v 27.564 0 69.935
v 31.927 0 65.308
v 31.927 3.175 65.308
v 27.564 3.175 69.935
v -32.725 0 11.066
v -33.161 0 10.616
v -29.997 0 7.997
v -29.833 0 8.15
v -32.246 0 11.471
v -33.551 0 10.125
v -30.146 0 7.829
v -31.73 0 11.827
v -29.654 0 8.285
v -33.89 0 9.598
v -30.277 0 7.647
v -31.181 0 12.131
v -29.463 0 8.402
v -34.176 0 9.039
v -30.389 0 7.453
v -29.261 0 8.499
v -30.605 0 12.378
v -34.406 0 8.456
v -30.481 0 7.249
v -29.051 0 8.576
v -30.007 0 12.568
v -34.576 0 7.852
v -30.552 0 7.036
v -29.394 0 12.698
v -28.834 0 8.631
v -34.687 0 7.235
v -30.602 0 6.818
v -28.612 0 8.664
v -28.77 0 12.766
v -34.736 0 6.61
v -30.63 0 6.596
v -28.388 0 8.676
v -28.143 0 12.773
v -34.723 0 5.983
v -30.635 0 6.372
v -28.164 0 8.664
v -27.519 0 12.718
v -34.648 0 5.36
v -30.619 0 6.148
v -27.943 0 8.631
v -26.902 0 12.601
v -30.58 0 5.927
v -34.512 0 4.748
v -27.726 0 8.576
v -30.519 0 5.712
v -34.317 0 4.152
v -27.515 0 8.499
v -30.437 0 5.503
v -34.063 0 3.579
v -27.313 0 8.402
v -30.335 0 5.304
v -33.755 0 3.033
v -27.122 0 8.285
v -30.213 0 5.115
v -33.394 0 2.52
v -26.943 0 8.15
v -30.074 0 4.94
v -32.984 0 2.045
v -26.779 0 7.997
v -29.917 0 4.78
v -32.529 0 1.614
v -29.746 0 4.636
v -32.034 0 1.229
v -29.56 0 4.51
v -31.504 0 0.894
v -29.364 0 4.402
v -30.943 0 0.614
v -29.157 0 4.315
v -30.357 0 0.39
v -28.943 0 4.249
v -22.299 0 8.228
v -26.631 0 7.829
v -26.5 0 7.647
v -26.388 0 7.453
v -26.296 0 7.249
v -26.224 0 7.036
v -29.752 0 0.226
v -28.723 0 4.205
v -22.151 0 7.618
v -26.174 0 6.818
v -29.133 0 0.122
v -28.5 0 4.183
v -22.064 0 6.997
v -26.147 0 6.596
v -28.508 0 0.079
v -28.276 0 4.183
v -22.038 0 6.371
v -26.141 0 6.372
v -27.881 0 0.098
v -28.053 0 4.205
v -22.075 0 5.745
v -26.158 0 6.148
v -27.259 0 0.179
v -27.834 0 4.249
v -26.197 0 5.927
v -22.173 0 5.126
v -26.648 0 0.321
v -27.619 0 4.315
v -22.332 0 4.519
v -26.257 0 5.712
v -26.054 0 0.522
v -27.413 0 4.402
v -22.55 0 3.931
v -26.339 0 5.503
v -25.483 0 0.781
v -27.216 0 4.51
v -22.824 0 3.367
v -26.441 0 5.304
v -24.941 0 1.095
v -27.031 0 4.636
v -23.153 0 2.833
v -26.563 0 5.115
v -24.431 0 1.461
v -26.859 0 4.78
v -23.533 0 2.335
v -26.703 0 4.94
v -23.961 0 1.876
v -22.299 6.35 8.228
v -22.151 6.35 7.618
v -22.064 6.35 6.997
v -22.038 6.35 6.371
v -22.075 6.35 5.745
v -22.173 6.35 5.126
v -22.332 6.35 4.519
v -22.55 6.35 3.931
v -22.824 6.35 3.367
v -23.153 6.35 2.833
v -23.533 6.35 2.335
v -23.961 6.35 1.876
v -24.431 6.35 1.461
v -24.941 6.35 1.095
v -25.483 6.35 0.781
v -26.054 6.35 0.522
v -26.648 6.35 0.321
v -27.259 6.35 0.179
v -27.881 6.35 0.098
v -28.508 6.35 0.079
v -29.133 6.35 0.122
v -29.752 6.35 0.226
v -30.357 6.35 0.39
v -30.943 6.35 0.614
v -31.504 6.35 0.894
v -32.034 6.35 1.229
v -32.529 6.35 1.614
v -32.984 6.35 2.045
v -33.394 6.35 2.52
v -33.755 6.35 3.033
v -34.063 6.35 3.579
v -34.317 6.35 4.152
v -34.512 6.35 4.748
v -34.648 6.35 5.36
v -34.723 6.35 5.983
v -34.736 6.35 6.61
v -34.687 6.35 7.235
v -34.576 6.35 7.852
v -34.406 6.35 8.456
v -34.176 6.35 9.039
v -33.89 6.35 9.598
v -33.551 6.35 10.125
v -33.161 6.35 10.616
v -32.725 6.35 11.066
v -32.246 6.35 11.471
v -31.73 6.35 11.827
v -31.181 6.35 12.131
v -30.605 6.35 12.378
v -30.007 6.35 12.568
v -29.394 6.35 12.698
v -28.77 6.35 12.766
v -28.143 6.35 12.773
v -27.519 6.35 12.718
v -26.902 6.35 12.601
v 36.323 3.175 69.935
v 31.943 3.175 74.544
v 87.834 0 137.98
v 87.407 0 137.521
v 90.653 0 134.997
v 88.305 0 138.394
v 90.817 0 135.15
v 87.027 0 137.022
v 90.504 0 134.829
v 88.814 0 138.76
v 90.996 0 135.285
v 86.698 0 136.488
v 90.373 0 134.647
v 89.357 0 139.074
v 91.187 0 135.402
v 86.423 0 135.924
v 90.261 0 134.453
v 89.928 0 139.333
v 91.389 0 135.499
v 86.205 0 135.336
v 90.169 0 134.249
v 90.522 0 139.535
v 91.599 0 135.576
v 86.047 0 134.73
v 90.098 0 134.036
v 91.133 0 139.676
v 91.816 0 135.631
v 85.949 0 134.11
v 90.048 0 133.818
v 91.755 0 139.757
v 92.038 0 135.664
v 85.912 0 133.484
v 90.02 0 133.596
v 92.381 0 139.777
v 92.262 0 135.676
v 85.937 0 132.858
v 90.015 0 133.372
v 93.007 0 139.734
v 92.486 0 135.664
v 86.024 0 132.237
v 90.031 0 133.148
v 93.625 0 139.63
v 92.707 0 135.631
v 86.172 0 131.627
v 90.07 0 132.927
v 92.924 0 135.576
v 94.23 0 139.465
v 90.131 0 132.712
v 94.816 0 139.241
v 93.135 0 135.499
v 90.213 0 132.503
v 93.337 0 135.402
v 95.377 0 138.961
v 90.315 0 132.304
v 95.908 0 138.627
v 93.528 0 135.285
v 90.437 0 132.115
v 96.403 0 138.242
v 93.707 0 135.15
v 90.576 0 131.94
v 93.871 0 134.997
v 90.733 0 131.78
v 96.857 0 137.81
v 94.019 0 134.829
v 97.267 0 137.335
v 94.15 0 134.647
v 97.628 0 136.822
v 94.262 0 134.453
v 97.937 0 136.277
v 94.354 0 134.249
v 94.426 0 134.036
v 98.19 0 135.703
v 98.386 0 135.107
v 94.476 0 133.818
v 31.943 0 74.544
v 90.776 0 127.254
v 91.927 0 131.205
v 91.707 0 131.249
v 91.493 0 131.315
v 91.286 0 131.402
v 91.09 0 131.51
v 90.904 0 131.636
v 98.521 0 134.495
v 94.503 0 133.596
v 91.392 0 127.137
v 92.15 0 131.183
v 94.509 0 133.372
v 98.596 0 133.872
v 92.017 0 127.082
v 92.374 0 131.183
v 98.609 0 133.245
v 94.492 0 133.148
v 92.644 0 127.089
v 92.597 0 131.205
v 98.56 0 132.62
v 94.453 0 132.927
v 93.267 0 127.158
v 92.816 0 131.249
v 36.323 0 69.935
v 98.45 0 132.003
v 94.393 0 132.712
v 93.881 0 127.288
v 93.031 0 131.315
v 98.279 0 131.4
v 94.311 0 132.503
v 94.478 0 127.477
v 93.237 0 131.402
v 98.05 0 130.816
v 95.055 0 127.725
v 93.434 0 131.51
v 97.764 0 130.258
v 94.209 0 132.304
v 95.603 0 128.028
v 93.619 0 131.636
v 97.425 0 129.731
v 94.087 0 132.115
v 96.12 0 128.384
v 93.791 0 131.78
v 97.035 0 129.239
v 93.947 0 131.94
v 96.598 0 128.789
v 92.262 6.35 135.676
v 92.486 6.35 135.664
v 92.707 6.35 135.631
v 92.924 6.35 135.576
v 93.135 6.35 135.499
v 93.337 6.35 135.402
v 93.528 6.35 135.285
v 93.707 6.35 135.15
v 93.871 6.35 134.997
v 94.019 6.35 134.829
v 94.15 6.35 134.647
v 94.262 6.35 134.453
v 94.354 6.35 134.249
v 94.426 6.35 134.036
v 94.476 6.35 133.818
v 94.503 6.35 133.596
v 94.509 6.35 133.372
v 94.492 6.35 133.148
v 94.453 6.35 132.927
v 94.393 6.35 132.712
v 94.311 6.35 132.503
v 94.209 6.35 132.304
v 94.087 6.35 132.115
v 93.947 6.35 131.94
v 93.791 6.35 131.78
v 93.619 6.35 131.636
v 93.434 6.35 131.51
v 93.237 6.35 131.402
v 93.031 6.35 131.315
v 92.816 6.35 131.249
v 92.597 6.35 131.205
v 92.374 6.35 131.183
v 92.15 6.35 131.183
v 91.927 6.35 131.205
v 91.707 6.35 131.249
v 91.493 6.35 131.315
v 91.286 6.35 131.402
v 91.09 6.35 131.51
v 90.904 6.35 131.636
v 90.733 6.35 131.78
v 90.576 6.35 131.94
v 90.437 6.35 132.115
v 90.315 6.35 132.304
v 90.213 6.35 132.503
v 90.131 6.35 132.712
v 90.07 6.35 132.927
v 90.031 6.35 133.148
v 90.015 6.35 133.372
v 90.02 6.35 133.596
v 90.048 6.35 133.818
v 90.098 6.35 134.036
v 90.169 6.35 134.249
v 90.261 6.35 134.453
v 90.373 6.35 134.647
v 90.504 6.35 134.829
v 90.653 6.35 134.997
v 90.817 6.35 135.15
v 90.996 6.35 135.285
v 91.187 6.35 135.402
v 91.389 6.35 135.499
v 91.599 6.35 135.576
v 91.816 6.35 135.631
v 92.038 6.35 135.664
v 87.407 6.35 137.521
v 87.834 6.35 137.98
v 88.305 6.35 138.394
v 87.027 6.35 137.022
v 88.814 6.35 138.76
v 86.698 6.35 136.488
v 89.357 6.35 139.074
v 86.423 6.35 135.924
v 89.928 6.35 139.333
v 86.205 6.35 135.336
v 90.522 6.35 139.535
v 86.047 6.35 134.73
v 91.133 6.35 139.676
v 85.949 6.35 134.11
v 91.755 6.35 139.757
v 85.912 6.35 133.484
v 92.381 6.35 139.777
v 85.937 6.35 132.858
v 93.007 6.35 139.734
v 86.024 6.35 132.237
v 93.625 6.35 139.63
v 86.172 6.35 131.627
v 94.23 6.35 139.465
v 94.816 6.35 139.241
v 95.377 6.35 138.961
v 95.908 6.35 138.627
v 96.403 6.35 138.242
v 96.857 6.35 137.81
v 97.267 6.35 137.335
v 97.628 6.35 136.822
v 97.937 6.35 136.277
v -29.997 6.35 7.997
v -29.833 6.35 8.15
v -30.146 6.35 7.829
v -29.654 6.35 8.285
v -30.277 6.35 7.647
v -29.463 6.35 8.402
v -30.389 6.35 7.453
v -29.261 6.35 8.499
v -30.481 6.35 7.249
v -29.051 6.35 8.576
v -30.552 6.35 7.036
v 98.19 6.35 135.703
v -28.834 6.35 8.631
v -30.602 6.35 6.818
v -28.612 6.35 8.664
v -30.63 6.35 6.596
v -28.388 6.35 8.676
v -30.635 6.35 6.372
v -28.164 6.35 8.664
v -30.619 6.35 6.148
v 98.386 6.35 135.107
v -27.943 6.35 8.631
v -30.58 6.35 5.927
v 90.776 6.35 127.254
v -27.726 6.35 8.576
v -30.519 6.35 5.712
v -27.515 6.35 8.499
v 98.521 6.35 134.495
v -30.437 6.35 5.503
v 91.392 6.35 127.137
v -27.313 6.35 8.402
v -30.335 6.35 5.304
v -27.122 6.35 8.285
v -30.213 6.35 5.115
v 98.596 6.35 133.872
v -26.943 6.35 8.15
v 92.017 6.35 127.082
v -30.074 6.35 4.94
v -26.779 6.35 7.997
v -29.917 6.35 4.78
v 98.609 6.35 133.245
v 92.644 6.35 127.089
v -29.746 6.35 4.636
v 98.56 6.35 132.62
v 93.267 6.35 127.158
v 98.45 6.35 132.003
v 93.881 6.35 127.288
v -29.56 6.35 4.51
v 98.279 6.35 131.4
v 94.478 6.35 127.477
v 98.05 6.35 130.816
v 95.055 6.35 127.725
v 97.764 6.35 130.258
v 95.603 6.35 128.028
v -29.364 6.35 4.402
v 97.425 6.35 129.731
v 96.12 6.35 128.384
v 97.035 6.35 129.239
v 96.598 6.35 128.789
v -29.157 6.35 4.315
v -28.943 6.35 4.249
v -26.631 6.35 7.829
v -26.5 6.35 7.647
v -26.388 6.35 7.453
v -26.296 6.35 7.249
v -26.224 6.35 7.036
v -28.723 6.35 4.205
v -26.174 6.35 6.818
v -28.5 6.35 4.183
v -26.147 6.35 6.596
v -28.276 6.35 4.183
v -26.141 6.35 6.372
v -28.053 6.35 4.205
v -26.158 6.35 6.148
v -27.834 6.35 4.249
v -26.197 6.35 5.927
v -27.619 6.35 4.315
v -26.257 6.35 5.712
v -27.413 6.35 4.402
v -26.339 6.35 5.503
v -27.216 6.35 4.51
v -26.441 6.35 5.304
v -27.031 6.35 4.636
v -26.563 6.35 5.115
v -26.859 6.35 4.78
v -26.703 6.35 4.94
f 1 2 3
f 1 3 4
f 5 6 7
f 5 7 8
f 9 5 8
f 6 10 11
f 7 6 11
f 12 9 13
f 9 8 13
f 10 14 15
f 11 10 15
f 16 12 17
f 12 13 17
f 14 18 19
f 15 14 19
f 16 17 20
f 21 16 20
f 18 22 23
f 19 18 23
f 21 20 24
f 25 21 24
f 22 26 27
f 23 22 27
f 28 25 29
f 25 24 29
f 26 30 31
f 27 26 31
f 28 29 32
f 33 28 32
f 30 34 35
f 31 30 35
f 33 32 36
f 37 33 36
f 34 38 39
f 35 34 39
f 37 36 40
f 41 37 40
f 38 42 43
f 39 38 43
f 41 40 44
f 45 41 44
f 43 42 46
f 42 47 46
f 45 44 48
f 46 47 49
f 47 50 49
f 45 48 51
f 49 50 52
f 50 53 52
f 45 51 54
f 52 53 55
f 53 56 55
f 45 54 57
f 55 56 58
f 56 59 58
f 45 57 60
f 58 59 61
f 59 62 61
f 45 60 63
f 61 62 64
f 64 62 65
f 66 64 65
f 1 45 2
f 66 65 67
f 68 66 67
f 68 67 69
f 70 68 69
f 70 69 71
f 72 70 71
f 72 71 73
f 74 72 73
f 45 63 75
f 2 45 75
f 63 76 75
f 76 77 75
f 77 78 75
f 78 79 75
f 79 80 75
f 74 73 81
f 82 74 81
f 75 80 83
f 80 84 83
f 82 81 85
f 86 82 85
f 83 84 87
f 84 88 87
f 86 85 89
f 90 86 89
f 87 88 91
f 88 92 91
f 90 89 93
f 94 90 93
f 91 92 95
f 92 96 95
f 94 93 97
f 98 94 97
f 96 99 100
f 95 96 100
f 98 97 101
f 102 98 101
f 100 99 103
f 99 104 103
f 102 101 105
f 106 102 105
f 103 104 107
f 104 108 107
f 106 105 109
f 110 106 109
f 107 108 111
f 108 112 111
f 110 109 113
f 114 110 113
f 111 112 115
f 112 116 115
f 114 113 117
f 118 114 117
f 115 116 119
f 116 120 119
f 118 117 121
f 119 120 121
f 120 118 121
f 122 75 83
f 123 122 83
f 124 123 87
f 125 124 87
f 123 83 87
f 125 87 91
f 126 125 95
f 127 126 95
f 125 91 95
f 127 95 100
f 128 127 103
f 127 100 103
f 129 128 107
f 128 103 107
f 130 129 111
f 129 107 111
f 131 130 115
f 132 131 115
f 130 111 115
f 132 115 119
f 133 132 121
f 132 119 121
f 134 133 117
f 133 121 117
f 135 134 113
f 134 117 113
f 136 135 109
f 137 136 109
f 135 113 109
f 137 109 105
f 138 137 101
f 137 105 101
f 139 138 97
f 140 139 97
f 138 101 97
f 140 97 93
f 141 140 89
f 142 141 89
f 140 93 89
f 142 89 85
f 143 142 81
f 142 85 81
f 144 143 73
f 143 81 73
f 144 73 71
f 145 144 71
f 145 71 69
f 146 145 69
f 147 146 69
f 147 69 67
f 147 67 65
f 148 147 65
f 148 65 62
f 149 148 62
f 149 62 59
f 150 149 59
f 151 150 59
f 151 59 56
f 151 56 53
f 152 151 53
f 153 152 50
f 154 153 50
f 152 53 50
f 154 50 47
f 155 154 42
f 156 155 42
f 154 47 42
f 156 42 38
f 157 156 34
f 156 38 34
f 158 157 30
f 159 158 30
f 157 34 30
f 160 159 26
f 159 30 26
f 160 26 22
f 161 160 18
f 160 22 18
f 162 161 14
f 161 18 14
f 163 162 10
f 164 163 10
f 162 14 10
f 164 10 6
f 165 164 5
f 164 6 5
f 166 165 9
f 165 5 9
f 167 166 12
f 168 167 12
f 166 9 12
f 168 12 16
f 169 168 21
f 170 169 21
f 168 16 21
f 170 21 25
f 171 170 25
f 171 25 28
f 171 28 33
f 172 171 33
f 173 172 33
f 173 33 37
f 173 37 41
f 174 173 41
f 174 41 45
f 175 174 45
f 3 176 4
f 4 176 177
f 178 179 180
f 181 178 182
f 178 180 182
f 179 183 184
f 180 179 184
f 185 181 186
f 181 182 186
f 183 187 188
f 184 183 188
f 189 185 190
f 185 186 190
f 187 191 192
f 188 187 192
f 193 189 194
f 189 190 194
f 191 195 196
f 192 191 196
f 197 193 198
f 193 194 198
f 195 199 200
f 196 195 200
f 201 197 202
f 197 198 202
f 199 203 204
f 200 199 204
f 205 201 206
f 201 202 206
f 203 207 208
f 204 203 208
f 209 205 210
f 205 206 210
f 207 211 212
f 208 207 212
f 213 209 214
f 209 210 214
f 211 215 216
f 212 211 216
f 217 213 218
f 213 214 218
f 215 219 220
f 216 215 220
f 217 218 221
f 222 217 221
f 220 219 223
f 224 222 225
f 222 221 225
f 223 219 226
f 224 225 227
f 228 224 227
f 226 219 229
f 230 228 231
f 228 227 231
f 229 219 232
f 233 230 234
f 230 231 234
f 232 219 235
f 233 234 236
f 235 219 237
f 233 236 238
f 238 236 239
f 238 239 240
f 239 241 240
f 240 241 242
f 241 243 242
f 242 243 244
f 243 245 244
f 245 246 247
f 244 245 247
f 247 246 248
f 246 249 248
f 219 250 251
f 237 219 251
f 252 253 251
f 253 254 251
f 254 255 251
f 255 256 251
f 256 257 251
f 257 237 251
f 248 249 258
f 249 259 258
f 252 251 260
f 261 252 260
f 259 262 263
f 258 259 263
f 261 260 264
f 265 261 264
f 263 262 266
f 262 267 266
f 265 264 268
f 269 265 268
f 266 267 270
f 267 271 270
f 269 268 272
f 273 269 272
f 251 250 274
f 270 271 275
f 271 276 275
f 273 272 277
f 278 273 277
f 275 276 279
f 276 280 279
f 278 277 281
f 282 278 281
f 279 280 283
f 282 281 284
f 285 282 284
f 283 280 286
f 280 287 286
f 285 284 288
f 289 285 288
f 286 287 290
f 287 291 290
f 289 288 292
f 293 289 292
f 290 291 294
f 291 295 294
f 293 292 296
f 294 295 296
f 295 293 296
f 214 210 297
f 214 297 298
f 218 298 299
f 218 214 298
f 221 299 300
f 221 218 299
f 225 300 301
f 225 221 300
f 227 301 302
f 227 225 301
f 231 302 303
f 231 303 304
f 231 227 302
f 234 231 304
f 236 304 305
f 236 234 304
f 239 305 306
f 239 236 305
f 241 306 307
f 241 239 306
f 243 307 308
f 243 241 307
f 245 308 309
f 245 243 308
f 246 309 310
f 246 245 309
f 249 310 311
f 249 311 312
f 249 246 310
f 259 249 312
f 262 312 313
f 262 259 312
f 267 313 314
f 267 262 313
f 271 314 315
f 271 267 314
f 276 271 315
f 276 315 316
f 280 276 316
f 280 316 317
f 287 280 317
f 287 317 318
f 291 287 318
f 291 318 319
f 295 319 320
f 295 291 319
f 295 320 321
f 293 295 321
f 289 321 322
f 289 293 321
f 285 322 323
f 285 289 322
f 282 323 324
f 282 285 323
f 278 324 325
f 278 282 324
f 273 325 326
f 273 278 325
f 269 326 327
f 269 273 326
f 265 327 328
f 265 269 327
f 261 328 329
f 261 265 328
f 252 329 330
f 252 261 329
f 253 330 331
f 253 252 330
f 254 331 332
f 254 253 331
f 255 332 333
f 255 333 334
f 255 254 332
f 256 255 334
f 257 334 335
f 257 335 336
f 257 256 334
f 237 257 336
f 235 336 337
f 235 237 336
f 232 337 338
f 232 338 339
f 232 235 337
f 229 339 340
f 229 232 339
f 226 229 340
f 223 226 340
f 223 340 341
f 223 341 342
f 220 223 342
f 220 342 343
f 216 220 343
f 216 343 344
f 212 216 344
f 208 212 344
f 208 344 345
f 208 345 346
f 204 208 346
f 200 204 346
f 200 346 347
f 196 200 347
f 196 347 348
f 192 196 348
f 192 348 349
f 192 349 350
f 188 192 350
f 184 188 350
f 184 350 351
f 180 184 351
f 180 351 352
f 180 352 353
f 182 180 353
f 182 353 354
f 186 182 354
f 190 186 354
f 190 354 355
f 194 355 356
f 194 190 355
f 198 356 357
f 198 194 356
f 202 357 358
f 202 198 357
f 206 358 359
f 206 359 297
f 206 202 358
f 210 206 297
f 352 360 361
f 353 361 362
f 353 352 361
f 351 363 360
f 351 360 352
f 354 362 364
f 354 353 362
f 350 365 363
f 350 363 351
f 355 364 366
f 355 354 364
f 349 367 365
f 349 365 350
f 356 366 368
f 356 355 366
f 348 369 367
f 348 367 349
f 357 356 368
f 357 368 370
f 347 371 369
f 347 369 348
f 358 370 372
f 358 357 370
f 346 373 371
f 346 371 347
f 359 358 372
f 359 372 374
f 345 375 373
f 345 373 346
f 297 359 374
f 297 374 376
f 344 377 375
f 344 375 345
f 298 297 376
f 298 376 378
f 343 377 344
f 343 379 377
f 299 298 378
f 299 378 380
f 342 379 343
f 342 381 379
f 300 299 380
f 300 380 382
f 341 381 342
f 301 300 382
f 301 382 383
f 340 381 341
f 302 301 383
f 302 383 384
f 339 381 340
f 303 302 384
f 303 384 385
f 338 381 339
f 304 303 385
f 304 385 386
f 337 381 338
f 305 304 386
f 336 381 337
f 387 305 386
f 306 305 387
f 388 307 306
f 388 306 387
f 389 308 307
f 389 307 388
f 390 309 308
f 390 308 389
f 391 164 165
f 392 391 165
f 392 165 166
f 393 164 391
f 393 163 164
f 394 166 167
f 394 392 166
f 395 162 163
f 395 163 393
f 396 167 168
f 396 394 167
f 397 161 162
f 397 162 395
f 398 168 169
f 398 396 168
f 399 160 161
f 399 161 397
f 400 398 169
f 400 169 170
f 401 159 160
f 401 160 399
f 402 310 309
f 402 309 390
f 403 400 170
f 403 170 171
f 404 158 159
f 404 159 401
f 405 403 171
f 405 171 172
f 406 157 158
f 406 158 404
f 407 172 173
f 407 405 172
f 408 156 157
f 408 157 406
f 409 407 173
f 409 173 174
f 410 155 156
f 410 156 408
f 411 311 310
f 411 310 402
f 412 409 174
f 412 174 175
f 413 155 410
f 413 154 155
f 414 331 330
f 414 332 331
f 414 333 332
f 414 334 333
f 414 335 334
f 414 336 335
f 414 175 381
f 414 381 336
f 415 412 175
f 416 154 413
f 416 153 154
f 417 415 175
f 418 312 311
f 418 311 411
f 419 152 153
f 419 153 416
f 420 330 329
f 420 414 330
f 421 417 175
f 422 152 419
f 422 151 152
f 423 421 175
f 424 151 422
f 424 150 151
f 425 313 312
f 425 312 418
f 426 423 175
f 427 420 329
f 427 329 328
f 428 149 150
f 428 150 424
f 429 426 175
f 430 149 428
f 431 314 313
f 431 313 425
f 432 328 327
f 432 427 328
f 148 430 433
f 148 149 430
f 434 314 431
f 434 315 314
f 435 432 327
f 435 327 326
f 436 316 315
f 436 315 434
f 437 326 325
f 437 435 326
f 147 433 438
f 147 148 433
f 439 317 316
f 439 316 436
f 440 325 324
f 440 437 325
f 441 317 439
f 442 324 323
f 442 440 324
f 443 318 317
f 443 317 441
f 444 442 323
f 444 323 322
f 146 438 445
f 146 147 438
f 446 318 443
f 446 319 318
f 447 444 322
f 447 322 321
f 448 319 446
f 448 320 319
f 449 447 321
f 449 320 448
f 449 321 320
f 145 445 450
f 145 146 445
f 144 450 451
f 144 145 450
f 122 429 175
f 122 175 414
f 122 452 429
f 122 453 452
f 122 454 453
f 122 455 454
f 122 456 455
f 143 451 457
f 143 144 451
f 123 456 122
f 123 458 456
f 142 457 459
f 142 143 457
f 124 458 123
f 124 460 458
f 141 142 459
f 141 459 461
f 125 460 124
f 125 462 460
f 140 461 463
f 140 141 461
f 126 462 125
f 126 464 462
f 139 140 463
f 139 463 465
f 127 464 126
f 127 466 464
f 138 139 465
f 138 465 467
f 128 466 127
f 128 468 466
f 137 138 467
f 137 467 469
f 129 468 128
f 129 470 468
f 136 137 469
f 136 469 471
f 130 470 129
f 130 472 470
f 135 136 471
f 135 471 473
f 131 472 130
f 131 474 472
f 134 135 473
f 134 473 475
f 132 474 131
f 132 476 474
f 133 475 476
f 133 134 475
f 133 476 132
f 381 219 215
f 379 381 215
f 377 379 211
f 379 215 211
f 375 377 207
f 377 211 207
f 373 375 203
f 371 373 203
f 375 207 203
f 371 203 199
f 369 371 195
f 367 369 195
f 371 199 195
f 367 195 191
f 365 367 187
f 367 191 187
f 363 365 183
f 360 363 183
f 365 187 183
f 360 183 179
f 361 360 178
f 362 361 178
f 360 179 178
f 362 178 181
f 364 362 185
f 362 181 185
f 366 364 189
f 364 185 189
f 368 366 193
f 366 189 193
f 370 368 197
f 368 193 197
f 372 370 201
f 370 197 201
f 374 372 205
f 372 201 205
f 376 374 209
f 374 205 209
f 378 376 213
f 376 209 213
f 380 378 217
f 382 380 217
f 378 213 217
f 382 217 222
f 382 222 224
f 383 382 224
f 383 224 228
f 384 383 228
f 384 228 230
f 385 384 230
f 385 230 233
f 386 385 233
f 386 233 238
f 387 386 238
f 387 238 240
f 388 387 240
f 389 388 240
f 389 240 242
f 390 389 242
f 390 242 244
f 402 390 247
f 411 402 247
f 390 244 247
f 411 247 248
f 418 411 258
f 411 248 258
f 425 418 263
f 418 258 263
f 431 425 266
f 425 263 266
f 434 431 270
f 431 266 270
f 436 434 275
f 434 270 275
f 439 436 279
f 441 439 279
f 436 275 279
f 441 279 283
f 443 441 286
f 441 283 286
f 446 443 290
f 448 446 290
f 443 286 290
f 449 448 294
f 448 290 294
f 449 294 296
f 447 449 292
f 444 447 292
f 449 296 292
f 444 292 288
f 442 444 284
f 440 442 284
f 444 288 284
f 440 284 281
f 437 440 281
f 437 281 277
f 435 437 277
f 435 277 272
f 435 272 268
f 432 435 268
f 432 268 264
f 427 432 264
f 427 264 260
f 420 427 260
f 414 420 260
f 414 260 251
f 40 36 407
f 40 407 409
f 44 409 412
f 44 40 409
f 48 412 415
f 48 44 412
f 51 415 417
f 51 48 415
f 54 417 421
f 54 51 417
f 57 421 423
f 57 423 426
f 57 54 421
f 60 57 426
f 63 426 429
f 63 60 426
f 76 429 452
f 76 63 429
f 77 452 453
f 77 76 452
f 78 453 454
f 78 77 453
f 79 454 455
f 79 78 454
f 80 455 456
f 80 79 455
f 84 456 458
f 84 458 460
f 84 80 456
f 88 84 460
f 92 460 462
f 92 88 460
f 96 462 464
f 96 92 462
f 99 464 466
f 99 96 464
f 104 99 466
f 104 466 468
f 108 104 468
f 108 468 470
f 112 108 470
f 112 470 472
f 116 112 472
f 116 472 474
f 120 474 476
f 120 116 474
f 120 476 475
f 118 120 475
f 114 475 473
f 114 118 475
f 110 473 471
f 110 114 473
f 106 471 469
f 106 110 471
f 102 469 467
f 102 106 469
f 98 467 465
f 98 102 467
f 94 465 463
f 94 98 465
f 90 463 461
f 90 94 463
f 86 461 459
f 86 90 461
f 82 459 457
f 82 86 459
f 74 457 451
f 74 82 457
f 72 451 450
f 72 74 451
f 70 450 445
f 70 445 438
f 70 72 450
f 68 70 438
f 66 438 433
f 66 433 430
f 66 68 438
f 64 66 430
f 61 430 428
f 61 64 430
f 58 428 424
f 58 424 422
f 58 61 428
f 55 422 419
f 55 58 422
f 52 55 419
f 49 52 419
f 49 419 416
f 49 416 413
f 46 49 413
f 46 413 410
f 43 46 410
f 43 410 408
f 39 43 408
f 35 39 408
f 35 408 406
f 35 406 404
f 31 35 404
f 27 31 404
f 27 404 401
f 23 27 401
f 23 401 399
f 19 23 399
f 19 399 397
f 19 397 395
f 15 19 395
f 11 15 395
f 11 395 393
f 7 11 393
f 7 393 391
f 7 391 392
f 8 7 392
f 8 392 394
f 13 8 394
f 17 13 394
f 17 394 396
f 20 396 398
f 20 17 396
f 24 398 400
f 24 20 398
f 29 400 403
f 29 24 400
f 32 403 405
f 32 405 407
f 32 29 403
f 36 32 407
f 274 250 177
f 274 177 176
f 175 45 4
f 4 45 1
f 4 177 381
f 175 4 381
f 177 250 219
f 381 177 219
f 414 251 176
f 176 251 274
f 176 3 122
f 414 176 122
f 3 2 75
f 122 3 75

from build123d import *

# Parameters (mm, degrees)
SKETCH1_R           = 2.2479
BOSS_EXTRUDE1_DEPTH = 6.35
CUT_EXTRUDE1_DEPTH  = 3.175


with BuildPart() as part:
    # Sketch1 → Boss-Extrude1 (new body)
    with BuildSketch(Plane(origin=(0, 0, 0), x_dir=(1, 0, 0), z_dir=(0, 1, 0))):
        with BuildLine():
            ThreePointArc((-22.298722012, -8.227846676), (-32.761767568, -1.823918477), (-26.902468415, -12.601405759))
            Line((-26.902468415, -12.601405759), (86.172305043, -131.627483084))
            ThreePointArc((86.172305043, -131.627483084), (96.635350599, -138.031411283), (90.776051446, -127.253924001))
            Line((90.776051446, -127.253924001), (-22.298722012, -8.227846676))
        make_face()
        with Locations(Location((92.261791516, -133.42766488, 0), (0, 0, 270))):
            Circle(SKETCH1_R, mode=Mode.SUBTRACT)
        with Locations(Location((-28.388208484, -6.42766488, 0), (0, 0, 270))):
            Circle(SKETCH1_R, mode=Mode.SUBTRACT)
    extrude(amount=BOSS_EXTRUDE1_DEPTH)

    # Sketch2 → Cut-Extrude1 (cut)
    with BuildSketch(Plane.XZ):
        Polygon((31.927377379, 65.307951298), (27.564134606, 69.934672098), (31.854628611, 74.63797054), (36.322762187, 69.934672148), align=None)
    extrude(amount=-CUT_EXTRUDE1_DEPTH, mode=Mode.SUBTRACT)


solid = part.part
